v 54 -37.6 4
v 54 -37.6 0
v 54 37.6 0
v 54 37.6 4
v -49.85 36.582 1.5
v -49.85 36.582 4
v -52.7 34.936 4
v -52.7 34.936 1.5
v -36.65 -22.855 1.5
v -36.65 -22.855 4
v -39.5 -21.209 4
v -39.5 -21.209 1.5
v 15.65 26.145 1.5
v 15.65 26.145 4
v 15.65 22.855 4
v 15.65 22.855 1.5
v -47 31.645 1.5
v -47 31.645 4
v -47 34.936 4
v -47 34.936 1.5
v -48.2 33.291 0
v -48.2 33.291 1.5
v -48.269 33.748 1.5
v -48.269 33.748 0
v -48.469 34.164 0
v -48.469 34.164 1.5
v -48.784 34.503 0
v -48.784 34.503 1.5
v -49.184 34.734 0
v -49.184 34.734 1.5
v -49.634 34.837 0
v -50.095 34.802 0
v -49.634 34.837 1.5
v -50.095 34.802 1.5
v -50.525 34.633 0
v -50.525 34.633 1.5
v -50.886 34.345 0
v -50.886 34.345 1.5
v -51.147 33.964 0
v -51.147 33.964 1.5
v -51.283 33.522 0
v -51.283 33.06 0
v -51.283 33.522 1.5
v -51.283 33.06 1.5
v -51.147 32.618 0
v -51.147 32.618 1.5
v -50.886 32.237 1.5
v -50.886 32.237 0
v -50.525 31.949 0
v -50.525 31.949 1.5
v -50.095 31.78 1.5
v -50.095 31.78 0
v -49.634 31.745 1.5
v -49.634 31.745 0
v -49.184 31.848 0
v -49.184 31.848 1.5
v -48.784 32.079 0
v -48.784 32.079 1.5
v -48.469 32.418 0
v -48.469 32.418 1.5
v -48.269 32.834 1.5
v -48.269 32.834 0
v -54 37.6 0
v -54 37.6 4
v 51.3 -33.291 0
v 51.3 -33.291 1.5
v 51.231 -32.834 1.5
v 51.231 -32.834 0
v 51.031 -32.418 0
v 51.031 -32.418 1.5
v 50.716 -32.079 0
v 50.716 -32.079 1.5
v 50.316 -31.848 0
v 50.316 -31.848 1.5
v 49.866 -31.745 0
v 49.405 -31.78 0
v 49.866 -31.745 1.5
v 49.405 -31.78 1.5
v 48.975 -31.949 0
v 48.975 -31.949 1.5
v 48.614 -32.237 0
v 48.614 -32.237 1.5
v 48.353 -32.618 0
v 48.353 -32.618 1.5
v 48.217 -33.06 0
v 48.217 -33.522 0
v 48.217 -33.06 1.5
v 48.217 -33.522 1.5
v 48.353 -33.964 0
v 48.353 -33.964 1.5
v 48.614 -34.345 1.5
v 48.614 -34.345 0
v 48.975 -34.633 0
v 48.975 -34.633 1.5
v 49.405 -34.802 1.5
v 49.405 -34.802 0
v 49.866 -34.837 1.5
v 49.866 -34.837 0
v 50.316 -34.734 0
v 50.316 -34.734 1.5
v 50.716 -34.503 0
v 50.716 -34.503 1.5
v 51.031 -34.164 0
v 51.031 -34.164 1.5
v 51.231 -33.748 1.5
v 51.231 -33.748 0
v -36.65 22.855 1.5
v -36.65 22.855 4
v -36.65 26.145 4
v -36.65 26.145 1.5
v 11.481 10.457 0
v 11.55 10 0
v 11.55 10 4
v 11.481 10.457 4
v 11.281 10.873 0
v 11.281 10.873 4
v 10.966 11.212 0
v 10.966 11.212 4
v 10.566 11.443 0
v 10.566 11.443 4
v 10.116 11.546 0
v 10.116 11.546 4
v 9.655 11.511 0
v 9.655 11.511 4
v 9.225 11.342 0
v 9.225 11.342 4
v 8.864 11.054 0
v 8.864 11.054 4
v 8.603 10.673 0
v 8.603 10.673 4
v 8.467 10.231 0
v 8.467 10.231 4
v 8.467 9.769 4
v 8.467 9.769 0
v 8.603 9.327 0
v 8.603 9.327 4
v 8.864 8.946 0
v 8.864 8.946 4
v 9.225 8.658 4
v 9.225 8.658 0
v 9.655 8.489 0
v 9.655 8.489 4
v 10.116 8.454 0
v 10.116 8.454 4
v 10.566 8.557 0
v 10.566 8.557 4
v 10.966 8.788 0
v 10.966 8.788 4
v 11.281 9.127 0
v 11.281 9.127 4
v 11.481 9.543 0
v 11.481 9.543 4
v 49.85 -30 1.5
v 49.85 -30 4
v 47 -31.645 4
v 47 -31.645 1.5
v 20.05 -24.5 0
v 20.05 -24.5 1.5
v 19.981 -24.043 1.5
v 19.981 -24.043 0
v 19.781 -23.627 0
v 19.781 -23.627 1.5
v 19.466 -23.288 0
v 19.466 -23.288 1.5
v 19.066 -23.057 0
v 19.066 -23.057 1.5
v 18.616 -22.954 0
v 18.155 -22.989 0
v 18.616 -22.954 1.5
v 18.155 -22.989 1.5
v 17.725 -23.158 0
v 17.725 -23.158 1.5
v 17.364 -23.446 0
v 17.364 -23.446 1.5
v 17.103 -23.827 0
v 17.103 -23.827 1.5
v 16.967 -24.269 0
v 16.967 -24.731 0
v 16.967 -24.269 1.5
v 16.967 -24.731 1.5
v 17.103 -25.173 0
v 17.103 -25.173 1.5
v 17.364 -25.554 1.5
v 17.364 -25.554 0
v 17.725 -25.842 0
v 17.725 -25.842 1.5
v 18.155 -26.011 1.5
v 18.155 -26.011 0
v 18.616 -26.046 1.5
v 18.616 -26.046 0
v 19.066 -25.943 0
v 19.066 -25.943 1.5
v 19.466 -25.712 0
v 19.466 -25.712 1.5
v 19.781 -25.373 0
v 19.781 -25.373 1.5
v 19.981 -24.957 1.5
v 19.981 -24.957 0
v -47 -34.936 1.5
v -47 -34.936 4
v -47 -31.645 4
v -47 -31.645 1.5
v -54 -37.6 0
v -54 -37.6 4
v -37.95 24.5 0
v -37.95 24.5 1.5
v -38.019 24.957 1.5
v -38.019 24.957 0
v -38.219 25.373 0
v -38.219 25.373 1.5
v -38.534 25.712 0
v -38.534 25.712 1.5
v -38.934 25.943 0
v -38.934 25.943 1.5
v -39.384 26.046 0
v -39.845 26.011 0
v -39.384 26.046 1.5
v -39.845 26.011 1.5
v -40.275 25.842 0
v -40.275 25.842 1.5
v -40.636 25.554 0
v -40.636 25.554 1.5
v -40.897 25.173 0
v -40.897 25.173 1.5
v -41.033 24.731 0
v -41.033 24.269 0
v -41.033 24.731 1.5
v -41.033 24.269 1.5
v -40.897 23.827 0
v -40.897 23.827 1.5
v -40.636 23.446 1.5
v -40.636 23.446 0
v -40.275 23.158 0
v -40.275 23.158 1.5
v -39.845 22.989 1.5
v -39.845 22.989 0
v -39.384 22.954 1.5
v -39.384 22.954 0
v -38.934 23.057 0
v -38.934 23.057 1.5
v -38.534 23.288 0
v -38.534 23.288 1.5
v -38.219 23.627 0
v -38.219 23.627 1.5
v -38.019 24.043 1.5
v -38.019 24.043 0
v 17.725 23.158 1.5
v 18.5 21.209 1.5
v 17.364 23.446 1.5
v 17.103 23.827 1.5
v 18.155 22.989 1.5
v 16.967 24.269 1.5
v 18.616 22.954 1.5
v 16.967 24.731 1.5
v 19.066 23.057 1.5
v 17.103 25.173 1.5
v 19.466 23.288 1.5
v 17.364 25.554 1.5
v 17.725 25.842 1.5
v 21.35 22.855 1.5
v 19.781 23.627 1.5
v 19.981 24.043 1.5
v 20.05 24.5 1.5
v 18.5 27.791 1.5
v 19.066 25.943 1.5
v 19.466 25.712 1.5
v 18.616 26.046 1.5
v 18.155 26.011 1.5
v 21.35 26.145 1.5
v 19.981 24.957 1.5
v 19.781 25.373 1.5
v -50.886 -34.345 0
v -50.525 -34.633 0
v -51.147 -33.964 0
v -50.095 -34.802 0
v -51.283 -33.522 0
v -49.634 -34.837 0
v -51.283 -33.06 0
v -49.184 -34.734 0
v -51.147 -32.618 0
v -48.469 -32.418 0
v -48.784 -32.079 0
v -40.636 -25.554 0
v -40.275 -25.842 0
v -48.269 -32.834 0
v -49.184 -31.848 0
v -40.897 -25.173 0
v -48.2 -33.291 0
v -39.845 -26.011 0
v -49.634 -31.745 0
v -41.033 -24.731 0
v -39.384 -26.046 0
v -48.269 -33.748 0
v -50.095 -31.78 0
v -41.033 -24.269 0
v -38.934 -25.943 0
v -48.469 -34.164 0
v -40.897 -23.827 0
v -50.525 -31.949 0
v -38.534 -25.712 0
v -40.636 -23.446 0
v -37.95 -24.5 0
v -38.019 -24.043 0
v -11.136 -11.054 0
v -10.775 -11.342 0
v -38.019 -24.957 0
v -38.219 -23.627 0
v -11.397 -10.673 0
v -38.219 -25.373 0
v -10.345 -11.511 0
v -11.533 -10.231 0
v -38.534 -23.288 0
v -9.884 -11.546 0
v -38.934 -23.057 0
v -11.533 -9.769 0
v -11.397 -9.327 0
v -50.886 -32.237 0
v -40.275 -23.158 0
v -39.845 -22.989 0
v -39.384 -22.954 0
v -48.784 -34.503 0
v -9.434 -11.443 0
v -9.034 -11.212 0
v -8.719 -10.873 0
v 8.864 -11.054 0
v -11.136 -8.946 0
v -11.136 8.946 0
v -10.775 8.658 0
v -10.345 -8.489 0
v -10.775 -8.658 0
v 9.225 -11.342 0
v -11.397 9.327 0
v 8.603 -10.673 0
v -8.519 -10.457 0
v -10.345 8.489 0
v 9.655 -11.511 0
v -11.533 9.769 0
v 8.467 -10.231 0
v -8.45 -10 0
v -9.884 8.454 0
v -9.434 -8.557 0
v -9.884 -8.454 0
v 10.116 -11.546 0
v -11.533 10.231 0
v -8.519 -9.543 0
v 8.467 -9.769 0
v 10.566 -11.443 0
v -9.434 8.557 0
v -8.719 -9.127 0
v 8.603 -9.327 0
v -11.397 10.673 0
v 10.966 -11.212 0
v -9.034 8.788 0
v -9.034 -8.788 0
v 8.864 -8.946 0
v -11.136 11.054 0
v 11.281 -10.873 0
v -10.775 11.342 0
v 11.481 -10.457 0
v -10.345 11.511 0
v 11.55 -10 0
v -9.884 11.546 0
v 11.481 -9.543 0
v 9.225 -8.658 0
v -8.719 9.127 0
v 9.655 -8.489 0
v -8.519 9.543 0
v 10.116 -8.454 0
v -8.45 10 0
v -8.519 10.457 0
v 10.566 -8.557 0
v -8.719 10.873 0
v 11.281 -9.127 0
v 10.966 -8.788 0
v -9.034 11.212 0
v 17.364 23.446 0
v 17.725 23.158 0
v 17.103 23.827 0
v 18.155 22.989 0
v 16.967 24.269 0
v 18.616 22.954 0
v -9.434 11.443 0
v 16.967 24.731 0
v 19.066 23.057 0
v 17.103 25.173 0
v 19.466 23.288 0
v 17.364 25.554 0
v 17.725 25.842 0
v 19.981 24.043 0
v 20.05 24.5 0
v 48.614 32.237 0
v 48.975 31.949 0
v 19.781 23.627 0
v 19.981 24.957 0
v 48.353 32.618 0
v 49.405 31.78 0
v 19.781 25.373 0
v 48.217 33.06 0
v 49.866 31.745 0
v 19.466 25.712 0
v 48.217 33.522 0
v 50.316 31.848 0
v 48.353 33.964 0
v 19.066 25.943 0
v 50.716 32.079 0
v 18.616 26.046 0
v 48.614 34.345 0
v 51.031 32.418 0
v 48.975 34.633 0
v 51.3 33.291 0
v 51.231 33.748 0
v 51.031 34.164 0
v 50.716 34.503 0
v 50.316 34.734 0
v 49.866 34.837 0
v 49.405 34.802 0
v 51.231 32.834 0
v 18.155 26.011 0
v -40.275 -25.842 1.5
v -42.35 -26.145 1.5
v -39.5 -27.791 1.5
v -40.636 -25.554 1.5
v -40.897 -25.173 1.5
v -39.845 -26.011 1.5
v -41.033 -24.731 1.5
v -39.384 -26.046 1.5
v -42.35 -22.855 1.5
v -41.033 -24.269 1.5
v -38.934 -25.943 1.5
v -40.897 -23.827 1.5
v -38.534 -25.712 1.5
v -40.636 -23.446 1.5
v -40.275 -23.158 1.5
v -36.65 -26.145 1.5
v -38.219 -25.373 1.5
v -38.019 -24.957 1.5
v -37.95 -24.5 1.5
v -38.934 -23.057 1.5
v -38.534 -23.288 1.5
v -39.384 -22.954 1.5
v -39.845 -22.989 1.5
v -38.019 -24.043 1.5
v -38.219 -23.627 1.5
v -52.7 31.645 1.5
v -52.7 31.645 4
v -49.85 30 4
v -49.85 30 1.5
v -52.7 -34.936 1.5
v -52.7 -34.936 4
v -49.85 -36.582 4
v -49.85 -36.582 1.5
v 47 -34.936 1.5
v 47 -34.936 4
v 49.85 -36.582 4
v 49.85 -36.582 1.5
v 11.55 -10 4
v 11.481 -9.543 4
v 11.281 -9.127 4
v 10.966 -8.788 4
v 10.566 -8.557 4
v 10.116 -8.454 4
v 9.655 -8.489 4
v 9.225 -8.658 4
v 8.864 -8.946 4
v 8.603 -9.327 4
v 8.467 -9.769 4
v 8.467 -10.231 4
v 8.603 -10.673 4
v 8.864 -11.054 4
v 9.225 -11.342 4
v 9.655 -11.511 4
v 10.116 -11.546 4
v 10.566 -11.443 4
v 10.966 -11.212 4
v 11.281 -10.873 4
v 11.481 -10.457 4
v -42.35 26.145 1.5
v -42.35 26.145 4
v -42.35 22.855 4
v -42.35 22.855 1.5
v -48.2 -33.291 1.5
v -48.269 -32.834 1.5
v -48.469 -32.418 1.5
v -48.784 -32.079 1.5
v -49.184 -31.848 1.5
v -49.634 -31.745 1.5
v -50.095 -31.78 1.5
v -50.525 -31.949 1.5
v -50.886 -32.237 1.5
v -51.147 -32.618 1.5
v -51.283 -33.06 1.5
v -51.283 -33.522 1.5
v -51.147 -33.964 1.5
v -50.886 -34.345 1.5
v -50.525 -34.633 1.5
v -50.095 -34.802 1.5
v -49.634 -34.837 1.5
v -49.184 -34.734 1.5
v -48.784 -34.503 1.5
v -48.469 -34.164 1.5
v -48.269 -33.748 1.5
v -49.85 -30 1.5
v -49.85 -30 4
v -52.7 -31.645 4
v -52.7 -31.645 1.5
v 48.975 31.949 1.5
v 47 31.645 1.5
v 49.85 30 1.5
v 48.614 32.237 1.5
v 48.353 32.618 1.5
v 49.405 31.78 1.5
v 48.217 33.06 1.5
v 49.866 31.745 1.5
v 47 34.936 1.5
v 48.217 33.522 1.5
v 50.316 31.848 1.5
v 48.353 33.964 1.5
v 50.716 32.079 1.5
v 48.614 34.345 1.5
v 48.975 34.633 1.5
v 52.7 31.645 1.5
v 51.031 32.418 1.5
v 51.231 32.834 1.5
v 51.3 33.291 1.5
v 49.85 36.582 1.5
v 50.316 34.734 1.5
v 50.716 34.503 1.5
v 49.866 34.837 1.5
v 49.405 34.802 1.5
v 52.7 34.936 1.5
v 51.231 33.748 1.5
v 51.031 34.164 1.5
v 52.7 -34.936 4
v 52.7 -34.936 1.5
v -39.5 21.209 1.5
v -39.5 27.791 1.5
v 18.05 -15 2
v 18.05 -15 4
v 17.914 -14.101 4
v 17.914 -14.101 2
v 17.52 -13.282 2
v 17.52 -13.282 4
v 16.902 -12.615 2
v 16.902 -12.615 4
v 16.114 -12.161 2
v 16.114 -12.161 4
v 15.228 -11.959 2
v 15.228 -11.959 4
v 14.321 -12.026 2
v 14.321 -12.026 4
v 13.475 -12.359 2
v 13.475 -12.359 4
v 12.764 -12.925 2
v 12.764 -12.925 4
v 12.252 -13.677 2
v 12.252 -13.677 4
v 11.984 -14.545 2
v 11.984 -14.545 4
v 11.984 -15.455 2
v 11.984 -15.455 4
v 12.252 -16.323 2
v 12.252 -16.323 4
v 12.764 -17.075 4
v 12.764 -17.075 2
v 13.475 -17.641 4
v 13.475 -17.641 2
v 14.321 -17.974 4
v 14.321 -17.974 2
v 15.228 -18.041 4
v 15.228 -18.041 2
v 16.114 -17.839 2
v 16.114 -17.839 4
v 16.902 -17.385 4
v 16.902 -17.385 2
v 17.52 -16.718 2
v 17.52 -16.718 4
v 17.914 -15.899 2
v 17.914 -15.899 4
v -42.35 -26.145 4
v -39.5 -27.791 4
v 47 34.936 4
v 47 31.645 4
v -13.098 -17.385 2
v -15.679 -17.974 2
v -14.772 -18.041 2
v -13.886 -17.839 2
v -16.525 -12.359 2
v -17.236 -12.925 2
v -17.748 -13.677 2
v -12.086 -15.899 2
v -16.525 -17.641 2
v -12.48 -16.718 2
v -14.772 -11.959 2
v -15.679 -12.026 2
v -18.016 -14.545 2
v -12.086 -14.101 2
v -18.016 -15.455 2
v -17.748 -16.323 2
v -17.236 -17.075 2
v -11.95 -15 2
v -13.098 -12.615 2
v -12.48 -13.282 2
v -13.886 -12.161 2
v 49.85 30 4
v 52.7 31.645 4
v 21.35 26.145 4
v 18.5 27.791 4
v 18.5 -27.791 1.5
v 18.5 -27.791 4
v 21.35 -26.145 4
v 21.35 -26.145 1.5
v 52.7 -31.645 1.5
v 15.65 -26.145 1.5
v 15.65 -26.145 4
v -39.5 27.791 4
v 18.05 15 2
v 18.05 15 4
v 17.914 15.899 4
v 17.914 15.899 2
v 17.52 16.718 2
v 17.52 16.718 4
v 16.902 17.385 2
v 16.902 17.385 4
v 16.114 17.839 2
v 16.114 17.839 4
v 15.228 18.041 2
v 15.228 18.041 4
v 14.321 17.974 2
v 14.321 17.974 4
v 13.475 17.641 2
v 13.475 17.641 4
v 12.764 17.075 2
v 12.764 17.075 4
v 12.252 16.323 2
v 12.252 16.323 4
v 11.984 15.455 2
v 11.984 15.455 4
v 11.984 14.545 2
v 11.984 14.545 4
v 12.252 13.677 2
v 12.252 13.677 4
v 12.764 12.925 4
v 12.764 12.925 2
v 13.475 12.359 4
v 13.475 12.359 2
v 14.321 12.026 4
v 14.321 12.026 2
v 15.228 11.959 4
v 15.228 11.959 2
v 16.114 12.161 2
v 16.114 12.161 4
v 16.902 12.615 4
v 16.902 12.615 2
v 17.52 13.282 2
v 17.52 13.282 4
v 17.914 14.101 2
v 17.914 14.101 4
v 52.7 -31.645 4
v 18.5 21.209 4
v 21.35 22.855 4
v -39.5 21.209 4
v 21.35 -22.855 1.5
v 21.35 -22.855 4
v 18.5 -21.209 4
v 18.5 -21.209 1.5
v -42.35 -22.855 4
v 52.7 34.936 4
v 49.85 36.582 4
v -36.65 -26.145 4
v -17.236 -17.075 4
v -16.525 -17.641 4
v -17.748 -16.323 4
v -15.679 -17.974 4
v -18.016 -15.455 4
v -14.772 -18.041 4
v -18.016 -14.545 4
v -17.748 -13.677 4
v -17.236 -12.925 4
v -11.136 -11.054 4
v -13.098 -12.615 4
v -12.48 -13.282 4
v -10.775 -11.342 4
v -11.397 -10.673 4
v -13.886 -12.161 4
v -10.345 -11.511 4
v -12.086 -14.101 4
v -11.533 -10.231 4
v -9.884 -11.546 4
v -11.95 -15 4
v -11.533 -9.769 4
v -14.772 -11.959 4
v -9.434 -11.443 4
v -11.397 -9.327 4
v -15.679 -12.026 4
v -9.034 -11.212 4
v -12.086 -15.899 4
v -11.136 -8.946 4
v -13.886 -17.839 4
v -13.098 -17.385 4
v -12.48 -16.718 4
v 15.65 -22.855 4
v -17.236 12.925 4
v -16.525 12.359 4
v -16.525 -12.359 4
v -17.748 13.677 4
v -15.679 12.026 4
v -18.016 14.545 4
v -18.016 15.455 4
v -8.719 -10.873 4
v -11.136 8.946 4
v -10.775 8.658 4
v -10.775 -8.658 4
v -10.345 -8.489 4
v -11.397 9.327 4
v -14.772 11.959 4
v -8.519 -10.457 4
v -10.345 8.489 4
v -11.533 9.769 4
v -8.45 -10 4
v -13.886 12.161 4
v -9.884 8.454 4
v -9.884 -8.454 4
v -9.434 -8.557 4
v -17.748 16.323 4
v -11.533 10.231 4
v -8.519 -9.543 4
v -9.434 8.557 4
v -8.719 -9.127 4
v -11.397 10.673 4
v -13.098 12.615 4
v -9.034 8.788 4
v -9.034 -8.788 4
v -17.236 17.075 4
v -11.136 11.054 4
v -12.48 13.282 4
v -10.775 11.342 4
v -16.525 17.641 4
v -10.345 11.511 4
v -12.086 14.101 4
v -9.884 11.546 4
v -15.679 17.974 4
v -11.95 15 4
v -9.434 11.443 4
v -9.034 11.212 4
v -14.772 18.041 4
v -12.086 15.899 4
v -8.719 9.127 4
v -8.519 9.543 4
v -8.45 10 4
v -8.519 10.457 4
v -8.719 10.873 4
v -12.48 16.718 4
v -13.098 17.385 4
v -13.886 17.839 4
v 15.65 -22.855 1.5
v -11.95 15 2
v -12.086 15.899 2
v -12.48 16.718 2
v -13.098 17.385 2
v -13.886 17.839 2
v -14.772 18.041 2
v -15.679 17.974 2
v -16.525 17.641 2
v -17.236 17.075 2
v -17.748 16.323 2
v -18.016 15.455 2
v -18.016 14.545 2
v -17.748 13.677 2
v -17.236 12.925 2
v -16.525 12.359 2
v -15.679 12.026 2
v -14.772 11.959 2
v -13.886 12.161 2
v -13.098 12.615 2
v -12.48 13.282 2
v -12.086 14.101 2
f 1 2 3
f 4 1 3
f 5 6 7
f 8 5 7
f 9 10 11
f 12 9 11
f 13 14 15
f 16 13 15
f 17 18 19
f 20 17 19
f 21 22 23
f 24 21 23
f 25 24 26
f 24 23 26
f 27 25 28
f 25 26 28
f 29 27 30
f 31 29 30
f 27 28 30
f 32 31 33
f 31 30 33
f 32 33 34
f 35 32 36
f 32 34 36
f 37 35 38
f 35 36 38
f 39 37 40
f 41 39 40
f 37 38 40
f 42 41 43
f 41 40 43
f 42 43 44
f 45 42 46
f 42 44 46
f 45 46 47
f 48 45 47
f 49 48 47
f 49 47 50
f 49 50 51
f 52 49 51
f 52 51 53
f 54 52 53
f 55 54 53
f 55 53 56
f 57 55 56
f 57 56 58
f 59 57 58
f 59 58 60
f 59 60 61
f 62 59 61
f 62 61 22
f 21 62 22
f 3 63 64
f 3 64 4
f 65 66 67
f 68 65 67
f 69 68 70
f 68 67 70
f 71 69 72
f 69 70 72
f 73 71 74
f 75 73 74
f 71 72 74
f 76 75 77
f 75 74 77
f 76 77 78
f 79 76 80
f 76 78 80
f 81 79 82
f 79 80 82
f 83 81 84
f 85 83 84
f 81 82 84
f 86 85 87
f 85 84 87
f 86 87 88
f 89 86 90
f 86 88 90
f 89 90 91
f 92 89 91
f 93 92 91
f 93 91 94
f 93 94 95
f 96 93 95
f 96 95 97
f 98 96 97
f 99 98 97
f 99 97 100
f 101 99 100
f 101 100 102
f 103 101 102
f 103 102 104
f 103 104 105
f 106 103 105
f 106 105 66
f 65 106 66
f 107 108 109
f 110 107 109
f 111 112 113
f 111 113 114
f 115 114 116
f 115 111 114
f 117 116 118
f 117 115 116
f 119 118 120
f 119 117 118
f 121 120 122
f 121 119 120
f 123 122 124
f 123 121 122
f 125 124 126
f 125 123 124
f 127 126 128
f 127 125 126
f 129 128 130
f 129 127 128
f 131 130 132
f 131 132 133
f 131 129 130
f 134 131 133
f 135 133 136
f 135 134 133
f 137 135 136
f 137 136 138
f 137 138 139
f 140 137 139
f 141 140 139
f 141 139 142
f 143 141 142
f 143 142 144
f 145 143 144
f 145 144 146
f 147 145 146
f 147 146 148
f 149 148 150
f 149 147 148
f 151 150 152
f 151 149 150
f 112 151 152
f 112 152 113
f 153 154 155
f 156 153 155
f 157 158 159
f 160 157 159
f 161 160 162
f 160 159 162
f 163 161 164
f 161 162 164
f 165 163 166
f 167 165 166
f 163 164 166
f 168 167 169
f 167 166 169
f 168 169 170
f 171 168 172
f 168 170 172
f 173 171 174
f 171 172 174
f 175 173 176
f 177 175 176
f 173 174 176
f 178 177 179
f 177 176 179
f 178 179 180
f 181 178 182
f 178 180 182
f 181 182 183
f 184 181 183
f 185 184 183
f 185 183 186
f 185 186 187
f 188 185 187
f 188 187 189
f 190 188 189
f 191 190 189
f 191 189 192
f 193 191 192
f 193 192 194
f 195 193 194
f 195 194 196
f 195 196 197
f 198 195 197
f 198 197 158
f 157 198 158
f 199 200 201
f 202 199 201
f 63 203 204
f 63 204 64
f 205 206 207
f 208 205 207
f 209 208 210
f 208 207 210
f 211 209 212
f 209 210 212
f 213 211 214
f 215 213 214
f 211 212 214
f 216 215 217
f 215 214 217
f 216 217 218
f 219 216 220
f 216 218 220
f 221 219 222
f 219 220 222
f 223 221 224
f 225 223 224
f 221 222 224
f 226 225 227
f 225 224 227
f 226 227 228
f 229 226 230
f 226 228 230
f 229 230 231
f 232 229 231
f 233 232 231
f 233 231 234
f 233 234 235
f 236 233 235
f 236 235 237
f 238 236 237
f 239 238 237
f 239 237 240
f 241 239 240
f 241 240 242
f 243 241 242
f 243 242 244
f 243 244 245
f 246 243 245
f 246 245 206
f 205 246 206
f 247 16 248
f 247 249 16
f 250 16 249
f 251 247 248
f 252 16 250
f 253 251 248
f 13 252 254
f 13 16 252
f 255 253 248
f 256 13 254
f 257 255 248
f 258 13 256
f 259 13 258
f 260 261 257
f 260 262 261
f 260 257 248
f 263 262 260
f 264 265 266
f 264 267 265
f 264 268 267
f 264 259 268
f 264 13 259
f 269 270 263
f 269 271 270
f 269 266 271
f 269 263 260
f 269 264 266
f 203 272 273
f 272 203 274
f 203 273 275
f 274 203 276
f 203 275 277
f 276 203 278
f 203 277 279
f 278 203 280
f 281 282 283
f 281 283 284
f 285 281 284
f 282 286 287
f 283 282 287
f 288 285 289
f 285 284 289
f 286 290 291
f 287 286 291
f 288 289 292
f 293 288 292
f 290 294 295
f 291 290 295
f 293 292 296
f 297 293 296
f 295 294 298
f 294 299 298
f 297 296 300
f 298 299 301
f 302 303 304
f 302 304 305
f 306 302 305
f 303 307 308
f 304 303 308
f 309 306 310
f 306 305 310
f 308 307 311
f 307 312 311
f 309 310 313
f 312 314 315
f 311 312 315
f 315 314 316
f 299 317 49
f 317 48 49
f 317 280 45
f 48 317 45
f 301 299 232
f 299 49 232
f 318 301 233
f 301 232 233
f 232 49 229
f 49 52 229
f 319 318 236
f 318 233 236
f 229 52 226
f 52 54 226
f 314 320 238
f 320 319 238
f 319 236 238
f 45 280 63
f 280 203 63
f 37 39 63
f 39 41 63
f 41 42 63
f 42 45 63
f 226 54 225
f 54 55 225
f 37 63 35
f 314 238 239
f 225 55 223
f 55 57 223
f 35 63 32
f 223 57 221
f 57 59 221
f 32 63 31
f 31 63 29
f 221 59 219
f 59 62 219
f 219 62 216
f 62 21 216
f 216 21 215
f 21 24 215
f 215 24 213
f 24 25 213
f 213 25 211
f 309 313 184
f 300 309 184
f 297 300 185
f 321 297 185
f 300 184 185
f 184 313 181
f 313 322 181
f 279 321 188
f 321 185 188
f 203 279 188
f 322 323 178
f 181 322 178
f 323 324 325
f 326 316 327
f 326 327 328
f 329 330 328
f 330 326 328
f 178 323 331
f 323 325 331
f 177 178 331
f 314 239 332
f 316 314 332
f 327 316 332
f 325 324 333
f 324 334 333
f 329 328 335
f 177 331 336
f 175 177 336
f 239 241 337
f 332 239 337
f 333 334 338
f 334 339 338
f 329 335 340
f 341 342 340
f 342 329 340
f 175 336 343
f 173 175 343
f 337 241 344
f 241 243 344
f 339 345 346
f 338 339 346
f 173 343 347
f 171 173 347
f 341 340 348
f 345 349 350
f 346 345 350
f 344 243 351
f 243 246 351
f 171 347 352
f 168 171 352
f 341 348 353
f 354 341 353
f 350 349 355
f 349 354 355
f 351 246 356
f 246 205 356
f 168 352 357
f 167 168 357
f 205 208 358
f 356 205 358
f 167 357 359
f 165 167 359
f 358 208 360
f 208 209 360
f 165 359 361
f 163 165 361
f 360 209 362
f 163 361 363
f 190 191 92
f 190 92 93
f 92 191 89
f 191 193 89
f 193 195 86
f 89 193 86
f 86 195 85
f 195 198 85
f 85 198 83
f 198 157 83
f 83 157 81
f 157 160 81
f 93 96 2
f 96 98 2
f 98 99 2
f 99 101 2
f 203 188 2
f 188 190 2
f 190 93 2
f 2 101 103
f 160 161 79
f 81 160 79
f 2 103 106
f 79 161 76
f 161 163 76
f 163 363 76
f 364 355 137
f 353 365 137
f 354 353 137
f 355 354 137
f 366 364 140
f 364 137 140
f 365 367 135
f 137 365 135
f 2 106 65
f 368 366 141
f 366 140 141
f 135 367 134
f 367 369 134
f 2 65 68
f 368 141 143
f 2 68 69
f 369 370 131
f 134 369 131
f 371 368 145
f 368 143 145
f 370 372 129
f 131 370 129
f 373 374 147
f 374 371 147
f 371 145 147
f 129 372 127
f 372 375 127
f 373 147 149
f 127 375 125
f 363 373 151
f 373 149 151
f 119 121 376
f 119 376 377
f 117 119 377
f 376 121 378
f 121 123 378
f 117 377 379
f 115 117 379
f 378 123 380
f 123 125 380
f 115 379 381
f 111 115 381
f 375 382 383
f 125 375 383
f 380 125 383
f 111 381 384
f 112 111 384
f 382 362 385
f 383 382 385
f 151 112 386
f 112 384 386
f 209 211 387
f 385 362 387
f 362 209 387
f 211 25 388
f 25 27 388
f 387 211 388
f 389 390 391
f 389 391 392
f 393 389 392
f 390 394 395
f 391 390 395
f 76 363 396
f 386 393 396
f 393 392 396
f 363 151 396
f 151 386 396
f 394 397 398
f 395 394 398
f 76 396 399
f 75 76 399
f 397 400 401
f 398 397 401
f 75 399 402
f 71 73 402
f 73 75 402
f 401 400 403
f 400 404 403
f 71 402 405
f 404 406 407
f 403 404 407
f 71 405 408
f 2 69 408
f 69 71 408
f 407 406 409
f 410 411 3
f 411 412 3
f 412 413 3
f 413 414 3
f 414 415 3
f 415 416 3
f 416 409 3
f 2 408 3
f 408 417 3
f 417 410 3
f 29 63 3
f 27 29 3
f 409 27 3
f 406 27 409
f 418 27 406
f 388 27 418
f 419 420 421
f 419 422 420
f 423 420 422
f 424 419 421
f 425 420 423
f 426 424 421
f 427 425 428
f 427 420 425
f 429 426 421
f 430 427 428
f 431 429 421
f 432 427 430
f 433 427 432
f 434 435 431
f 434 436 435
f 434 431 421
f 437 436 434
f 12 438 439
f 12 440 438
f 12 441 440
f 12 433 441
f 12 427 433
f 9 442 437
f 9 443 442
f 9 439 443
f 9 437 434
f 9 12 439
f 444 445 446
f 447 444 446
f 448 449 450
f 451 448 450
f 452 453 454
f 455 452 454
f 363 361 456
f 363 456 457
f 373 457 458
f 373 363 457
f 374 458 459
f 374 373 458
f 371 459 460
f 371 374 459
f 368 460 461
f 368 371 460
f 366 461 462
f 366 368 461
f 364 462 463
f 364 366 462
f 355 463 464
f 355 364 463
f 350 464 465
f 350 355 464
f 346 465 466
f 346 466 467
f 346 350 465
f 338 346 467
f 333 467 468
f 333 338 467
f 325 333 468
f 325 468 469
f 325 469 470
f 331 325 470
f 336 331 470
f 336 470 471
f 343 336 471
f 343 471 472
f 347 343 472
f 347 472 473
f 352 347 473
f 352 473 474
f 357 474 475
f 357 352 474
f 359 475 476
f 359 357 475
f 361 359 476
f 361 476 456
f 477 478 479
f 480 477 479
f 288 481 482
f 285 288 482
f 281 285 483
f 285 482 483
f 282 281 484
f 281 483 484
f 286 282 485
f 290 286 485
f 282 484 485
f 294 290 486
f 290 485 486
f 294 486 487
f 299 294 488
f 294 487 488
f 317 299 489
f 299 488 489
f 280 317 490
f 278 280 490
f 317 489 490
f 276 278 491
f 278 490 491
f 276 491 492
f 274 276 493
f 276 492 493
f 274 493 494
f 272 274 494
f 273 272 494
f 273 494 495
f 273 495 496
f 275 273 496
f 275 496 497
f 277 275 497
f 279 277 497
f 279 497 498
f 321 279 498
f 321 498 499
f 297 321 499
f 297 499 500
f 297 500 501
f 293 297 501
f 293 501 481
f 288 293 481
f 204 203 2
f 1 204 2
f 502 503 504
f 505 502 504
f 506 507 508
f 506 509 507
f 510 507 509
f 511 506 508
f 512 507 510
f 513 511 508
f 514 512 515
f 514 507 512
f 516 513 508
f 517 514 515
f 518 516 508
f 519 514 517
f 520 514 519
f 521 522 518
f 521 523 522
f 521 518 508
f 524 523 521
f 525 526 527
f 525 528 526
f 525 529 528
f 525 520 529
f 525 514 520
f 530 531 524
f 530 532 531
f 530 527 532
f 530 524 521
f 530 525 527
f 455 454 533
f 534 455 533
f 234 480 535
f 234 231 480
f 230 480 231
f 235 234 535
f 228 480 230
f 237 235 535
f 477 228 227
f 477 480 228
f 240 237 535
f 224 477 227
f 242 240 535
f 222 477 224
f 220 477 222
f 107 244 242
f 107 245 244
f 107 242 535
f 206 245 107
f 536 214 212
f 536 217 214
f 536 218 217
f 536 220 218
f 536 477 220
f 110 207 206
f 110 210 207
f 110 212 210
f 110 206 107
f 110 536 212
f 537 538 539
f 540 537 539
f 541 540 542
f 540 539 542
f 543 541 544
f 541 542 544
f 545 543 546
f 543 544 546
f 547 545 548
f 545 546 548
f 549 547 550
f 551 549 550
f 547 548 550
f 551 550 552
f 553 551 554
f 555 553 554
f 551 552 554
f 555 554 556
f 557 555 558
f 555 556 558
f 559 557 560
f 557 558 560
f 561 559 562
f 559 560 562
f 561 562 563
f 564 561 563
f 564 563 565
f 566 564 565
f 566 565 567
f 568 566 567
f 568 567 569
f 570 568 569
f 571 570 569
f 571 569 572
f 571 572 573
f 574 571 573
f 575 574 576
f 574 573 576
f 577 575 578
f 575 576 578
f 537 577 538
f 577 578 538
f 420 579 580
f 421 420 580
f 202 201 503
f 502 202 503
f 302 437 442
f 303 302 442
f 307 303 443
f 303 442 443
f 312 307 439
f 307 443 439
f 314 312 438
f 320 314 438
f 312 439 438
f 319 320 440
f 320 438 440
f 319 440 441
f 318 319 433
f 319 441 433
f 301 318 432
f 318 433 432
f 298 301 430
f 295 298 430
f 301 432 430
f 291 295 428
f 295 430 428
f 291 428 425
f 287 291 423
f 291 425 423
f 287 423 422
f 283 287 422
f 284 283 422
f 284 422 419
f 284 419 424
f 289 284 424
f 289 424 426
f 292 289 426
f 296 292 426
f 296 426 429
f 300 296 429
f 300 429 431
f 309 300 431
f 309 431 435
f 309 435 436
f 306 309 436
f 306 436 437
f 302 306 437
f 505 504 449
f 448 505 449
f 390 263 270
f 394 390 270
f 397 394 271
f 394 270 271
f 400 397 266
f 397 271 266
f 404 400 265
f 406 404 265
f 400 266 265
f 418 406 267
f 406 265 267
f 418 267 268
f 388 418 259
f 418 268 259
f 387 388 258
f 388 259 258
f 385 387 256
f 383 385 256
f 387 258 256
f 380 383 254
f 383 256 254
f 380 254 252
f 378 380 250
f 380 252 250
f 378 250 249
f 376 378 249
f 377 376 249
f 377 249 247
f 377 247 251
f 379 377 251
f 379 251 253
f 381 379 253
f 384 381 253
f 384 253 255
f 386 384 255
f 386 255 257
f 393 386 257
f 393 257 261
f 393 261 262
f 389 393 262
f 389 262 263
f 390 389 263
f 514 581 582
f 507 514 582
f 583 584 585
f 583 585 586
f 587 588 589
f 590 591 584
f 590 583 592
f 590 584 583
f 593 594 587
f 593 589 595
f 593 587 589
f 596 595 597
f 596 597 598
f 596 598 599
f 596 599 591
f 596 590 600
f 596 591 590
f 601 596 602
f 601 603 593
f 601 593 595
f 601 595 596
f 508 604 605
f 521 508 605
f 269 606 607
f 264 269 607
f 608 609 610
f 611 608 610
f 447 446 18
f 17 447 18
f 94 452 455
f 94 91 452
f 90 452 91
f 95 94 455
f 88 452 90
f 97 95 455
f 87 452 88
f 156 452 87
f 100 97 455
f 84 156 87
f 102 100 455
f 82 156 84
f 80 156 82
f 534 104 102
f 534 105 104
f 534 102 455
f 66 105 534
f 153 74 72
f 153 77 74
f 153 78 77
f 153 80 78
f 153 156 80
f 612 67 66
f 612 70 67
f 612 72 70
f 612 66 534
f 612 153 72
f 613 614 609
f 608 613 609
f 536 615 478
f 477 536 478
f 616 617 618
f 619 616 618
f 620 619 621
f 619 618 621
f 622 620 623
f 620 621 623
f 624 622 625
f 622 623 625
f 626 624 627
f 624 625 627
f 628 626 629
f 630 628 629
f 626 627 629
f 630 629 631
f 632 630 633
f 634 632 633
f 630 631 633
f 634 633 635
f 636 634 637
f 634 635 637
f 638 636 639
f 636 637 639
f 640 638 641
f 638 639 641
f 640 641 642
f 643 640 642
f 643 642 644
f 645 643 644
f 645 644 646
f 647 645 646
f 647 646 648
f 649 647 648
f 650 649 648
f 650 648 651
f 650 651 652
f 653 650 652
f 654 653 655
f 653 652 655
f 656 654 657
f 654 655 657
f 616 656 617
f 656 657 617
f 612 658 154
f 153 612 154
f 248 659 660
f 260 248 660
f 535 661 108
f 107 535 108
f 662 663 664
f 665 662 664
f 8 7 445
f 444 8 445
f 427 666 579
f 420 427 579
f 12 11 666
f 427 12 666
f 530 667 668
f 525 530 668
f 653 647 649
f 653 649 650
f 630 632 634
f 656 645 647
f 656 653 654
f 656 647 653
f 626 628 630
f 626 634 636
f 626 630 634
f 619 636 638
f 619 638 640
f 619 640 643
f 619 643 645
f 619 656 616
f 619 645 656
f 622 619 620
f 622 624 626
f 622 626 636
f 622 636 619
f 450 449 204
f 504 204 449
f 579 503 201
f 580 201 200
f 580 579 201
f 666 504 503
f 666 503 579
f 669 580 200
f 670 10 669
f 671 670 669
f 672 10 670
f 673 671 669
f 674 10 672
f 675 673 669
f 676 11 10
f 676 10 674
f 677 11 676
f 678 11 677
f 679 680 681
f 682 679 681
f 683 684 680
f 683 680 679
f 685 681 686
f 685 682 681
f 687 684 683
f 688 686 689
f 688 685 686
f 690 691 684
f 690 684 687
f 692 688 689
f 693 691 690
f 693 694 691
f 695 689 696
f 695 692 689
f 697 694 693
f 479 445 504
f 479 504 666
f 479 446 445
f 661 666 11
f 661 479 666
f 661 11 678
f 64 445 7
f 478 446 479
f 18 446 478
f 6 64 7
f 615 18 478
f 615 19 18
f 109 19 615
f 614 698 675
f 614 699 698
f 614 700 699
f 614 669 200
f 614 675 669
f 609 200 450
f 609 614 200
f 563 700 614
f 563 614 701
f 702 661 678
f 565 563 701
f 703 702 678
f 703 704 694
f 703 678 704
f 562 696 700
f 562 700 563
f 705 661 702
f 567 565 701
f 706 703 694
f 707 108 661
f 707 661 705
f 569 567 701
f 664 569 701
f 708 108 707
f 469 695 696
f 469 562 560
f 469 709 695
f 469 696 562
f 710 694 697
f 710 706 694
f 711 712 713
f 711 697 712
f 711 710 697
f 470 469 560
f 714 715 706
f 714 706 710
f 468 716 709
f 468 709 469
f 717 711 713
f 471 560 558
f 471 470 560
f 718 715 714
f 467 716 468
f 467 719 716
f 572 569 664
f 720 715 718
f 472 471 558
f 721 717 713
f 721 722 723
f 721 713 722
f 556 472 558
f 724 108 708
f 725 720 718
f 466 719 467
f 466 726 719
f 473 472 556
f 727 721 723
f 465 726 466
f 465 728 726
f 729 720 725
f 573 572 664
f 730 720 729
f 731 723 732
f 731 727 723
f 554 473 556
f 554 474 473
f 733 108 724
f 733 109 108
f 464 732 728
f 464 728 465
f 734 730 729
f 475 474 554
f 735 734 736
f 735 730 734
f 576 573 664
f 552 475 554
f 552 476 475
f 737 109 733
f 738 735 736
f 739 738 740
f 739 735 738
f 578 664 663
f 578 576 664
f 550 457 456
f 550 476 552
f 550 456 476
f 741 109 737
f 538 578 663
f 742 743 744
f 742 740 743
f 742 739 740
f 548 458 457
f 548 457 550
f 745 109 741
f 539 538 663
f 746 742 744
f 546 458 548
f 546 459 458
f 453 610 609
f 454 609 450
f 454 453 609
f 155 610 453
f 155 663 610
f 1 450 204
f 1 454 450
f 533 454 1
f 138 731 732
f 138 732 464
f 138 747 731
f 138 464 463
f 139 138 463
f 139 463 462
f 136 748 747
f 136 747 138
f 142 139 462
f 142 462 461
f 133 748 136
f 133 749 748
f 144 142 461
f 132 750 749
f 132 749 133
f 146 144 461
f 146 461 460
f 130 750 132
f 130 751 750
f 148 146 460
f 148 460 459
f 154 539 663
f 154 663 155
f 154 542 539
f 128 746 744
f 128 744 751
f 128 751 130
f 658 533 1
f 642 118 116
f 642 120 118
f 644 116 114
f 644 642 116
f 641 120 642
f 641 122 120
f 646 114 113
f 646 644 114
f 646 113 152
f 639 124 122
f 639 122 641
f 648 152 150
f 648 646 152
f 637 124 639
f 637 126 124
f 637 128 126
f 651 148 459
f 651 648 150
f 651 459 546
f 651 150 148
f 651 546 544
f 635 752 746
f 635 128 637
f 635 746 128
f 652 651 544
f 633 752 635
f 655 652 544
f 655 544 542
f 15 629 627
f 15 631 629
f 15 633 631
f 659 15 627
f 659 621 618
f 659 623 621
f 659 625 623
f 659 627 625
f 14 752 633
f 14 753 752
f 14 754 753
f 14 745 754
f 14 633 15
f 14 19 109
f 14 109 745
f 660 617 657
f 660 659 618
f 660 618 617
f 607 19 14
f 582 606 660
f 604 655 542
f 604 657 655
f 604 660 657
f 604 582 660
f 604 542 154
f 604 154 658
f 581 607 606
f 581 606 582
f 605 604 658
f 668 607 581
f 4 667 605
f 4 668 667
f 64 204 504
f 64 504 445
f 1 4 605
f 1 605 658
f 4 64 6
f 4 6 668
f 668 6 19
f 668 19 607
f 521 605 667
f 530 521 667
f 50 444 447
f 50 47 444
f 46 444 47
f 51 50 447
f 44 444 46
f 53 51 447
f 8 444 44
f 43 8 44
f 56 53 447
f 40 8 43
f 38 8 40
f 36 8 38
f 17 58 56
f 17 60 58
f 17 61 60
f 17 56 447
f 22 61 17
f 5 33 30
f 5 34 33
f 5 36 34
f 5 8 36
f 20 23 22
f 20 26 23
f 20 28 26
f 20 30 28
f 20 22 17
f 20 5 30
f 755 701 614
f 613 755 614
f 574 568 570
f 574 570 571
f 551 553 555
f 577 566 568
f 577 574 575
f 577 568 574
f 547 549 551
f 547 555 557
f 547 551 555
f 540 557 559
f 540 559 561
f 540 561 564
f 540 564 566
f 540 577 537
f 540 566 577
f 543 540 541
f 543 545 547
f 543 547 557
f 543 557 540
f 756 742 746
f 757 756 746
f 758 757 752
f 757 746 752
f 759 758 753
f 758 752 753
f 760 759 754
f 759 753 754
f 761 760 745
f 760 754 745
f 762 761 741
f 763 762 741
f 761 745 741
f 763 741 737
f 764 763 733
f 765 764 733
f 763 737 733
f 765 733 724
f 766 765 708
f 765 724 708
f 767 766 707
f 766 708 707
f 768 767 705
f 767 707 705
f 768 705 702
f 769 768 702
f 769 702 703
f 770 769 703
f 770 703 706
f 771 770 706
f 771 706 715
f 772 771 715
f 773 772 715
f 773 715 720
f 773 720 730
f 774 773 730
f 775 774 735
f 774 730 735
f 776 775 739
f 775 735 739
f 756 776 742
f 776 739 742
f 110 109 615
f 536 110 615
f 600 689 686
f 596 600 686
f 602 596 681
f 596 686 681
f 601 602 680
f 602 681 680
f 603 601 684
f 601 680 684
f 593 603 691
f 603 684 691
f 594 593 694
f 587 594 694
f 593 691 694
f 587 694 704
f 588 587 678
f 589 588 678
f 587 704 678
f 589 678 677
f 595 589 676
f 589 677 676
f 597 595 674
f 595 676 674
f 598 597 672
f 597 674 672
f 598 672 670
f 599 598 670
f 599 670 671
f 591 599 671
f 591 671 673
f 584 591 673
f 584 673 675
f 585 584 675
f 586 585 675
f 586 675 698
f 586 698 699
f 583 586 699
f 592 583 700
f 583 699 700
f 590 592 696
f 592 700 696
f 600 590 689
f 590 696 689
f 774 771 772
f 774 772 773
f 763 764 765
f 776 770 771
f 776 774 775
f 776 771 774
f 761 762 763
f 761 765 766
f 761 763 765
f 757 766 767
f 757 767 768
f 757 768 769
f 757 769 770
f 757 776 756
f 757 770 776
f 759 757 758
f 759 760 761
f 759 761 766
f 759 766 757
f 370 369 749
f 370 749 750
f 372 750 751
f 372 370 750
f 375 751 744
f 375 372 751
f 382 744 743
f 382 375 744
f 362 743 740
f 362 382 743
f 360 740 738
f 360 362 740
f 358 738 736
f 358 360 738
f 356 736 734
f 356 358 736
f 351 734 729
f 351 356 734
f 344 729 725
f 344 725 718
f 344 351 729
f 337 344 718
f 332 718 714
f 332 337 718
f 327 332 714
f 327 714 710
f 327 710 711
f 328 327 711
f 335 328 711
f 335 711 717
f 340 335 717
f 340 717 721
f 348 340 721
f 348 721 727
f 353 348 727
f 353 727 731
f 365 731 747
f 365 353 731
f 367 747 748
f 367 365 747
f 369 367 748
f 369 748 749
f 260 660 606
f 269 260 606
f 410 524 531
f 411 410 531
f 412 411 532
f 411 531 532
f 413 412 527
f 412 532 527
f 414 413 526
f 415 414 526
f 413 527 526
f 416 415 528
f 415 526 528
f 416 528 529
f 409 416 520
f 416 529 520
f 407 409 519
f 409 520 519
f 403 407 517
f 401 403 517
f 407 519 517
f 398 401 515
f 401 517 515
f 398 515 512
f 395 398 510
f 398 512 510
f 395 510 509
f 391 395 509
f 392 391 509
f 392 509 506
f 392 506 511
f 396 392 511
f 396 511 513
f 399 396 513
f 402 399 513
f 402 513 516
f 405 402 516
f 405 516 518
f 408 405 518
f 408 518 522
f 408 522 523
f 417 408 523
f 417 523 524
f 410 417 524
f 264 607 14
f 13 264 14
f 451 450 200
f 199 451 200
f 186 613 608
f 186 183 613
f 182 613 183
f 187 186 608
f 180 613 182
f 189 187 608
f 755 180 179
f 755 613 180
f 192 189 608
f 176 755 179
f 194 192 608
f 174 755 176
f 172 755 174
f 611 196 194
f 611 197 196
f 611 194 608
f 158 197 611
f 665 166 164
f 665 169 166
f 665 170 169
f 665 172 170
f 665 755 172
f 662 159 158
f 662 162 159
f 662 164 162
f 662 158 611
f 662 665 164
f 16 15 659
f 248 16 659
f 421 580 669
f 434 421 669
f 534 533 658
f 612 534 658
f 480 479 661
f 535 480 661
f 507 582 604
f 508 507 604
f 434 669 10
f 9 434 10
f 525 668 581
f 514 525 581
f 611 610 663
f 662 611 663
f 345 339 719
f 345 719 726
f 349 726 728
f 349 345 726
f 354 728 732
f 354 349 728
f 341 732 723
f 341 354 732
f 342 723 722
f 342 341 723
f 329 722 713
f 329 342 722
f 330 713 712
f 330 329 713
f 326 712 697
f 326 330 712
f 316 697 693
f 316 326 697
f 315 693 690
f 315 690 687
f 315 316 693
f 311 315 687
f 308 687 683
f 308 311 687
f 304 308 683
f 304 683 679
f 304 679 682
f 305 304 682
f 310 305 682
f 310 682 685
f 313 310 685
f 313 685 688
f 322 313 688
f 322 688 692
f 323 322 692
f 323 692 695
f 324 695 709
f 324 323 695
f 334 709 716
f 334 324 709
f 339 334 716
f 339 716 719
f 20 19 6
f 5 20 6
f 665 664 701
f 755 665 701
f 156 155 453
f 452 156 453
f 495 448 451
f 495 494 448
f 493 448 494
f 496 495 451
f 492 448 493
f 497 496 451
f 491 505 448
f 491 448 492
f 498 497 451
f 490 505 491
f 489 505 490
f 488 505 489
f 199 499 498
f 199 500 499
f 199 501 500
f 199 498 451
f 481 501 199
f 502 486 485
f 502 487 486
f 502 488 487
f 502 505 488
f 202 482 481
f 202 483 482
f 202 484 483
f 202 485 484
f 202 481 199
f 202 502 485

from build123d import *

# Parameters (mm, degrees)
SKETCH_W        = 108
SKETCH_H        = 75.2
SKETCH_R        = 1.55
PAD_DEPTH       = 4
SKETCH001_R     = 3.05
POCKET_DEPTH    = 2
POCKET001_DEPTH = 2.5
SKETCH003_R     = 1.55
POCKET002_DEPTH = 4


with BuildPart() as part:
    # Sketch → Pad (new body)
    with BuildSketch(Plane.XY):
        Rectangle(SKETCH_W, SKETCH_H)
        with Locations((-10, 10)):
            Circle(SKETCH_R, mode=Mode.SUBTRACT)
        with Locations((10, 10)):
            Circle(SKETCH_R, mode=Mode.SUBTRACT)
        with Locations((10, -10)):
            Circle(SKETCH_R, mode=Mode.SUBTRACT)
        with Locations((-10, -10)):
            Circle(SKETCH_R, mode=Mode.SUBTRACT)
    extrude(amount=PAD_DEPTH)

    # Sketch001 (on Face10 of Pad) → Pocket (cut)
    with BuildSketch(Plane.XY.offset(4)):
        with Locations((-15, 15)):
            Circle(SKETCH001_R)
        with Locations((15, 15)):
            Circle(SKETCH001_R)
        with Locations((15, -15)):
            Circle(SKETCH001_R)
        with Locations((-15, -15)):
            Circle(SKETCH001_R)
    extrude(amount=-POCKET_DEPTH, mode=Mode.SUBTRACT)

    # Sketch002 (on Face5 of Pocket) → Pocket001 (cut)
    with BuildSketch(Plane.XY.offset(4)):
        Polygon((-47, 31.645448), (-47, 34.936345), (-49.85, 36.581793), (-52.7, 34.936345), (-52.7, 31.645448), (-49.85, 30), align=None)
        Polygon((-49.85, -36.581793), (-47, -34.936345), (-47, -31.645448), (-49.85, -30), (-52.7, -31.645448), (-52.7, -34.936345), align=None)
        Polygon((52.7, -34.936345), (52.7, -31.645448), (49.85, -30), (47, -31.645448), (47, -34.936345), (49.85, -36.581793), align=None)
        Polygon((52.7, 31.645448), (52.7, 34.936345), (49.85, 36.581793), (47, 34.936345), (47, 31.645448), (49.85, 30), align=None)
        Polygon((-36.65, 22.854552), (-36.65, 26.145448), (-39.5, 27.790897), (-42.35, 26.145448), (-42.35, 22.854552), (-39.5, 21.209103), align=None)
        Polygon((21.35, 26.145448), (18.5, 27.790897), (15.65, 26.145448), (15.65, 22.854552), (18.5, 21.209103), (21.35, 22.854552), align=None)
        Polygon((21.35, -26.145448), (21.35, -22.854552), (18.5, -21.209103), (15.65, -22.854552), (15.65, -26.145448), (18.5, -27.790897), align=None)
        Polygon((-36.65, -26.145448), (-36.65, -22.854552), (-39.5, -21.209103), (-42.35, -22.854552), (-42.35, -26.145448), (-39.5, -27.790897), align=None)
    extrude(amount=-POCKET001_DEPTH, mode=Mode.SUBTRACT)

    # Sketch003 (on Face5 of Pocket001) → Pocket002 (cut)
    with BuildSketch(Plane.XY.offset(4)):
        with Locations((-49.75, 33.291)):
            Circle(SKETCH003_R)
        with Locations((-39.5, 24.5)):
            Circle(SKETCH003_R)
        with Locations((18.5, 24.5)):
            Circle(SKETCH003_R)
        with Locations((49.75, 33.291)):
            Circle(SKETCH003_R)
        with Locations((49.75, -33.291)):
            Circle(SKETCH003_R)
        with Locations((18.5, -24.5)):
            Circle(SKETCH003_R)
        with Locations((-39.5, -24.5)):
            Circle(SKETCH003_R)
        with Locations((-49.75, -33.291)):
            Circle(SKETCH003_R)
    extrude(amount=-POCKET002_DEPTH, mode=Mode.SUBTRACT)


solid = part.part
